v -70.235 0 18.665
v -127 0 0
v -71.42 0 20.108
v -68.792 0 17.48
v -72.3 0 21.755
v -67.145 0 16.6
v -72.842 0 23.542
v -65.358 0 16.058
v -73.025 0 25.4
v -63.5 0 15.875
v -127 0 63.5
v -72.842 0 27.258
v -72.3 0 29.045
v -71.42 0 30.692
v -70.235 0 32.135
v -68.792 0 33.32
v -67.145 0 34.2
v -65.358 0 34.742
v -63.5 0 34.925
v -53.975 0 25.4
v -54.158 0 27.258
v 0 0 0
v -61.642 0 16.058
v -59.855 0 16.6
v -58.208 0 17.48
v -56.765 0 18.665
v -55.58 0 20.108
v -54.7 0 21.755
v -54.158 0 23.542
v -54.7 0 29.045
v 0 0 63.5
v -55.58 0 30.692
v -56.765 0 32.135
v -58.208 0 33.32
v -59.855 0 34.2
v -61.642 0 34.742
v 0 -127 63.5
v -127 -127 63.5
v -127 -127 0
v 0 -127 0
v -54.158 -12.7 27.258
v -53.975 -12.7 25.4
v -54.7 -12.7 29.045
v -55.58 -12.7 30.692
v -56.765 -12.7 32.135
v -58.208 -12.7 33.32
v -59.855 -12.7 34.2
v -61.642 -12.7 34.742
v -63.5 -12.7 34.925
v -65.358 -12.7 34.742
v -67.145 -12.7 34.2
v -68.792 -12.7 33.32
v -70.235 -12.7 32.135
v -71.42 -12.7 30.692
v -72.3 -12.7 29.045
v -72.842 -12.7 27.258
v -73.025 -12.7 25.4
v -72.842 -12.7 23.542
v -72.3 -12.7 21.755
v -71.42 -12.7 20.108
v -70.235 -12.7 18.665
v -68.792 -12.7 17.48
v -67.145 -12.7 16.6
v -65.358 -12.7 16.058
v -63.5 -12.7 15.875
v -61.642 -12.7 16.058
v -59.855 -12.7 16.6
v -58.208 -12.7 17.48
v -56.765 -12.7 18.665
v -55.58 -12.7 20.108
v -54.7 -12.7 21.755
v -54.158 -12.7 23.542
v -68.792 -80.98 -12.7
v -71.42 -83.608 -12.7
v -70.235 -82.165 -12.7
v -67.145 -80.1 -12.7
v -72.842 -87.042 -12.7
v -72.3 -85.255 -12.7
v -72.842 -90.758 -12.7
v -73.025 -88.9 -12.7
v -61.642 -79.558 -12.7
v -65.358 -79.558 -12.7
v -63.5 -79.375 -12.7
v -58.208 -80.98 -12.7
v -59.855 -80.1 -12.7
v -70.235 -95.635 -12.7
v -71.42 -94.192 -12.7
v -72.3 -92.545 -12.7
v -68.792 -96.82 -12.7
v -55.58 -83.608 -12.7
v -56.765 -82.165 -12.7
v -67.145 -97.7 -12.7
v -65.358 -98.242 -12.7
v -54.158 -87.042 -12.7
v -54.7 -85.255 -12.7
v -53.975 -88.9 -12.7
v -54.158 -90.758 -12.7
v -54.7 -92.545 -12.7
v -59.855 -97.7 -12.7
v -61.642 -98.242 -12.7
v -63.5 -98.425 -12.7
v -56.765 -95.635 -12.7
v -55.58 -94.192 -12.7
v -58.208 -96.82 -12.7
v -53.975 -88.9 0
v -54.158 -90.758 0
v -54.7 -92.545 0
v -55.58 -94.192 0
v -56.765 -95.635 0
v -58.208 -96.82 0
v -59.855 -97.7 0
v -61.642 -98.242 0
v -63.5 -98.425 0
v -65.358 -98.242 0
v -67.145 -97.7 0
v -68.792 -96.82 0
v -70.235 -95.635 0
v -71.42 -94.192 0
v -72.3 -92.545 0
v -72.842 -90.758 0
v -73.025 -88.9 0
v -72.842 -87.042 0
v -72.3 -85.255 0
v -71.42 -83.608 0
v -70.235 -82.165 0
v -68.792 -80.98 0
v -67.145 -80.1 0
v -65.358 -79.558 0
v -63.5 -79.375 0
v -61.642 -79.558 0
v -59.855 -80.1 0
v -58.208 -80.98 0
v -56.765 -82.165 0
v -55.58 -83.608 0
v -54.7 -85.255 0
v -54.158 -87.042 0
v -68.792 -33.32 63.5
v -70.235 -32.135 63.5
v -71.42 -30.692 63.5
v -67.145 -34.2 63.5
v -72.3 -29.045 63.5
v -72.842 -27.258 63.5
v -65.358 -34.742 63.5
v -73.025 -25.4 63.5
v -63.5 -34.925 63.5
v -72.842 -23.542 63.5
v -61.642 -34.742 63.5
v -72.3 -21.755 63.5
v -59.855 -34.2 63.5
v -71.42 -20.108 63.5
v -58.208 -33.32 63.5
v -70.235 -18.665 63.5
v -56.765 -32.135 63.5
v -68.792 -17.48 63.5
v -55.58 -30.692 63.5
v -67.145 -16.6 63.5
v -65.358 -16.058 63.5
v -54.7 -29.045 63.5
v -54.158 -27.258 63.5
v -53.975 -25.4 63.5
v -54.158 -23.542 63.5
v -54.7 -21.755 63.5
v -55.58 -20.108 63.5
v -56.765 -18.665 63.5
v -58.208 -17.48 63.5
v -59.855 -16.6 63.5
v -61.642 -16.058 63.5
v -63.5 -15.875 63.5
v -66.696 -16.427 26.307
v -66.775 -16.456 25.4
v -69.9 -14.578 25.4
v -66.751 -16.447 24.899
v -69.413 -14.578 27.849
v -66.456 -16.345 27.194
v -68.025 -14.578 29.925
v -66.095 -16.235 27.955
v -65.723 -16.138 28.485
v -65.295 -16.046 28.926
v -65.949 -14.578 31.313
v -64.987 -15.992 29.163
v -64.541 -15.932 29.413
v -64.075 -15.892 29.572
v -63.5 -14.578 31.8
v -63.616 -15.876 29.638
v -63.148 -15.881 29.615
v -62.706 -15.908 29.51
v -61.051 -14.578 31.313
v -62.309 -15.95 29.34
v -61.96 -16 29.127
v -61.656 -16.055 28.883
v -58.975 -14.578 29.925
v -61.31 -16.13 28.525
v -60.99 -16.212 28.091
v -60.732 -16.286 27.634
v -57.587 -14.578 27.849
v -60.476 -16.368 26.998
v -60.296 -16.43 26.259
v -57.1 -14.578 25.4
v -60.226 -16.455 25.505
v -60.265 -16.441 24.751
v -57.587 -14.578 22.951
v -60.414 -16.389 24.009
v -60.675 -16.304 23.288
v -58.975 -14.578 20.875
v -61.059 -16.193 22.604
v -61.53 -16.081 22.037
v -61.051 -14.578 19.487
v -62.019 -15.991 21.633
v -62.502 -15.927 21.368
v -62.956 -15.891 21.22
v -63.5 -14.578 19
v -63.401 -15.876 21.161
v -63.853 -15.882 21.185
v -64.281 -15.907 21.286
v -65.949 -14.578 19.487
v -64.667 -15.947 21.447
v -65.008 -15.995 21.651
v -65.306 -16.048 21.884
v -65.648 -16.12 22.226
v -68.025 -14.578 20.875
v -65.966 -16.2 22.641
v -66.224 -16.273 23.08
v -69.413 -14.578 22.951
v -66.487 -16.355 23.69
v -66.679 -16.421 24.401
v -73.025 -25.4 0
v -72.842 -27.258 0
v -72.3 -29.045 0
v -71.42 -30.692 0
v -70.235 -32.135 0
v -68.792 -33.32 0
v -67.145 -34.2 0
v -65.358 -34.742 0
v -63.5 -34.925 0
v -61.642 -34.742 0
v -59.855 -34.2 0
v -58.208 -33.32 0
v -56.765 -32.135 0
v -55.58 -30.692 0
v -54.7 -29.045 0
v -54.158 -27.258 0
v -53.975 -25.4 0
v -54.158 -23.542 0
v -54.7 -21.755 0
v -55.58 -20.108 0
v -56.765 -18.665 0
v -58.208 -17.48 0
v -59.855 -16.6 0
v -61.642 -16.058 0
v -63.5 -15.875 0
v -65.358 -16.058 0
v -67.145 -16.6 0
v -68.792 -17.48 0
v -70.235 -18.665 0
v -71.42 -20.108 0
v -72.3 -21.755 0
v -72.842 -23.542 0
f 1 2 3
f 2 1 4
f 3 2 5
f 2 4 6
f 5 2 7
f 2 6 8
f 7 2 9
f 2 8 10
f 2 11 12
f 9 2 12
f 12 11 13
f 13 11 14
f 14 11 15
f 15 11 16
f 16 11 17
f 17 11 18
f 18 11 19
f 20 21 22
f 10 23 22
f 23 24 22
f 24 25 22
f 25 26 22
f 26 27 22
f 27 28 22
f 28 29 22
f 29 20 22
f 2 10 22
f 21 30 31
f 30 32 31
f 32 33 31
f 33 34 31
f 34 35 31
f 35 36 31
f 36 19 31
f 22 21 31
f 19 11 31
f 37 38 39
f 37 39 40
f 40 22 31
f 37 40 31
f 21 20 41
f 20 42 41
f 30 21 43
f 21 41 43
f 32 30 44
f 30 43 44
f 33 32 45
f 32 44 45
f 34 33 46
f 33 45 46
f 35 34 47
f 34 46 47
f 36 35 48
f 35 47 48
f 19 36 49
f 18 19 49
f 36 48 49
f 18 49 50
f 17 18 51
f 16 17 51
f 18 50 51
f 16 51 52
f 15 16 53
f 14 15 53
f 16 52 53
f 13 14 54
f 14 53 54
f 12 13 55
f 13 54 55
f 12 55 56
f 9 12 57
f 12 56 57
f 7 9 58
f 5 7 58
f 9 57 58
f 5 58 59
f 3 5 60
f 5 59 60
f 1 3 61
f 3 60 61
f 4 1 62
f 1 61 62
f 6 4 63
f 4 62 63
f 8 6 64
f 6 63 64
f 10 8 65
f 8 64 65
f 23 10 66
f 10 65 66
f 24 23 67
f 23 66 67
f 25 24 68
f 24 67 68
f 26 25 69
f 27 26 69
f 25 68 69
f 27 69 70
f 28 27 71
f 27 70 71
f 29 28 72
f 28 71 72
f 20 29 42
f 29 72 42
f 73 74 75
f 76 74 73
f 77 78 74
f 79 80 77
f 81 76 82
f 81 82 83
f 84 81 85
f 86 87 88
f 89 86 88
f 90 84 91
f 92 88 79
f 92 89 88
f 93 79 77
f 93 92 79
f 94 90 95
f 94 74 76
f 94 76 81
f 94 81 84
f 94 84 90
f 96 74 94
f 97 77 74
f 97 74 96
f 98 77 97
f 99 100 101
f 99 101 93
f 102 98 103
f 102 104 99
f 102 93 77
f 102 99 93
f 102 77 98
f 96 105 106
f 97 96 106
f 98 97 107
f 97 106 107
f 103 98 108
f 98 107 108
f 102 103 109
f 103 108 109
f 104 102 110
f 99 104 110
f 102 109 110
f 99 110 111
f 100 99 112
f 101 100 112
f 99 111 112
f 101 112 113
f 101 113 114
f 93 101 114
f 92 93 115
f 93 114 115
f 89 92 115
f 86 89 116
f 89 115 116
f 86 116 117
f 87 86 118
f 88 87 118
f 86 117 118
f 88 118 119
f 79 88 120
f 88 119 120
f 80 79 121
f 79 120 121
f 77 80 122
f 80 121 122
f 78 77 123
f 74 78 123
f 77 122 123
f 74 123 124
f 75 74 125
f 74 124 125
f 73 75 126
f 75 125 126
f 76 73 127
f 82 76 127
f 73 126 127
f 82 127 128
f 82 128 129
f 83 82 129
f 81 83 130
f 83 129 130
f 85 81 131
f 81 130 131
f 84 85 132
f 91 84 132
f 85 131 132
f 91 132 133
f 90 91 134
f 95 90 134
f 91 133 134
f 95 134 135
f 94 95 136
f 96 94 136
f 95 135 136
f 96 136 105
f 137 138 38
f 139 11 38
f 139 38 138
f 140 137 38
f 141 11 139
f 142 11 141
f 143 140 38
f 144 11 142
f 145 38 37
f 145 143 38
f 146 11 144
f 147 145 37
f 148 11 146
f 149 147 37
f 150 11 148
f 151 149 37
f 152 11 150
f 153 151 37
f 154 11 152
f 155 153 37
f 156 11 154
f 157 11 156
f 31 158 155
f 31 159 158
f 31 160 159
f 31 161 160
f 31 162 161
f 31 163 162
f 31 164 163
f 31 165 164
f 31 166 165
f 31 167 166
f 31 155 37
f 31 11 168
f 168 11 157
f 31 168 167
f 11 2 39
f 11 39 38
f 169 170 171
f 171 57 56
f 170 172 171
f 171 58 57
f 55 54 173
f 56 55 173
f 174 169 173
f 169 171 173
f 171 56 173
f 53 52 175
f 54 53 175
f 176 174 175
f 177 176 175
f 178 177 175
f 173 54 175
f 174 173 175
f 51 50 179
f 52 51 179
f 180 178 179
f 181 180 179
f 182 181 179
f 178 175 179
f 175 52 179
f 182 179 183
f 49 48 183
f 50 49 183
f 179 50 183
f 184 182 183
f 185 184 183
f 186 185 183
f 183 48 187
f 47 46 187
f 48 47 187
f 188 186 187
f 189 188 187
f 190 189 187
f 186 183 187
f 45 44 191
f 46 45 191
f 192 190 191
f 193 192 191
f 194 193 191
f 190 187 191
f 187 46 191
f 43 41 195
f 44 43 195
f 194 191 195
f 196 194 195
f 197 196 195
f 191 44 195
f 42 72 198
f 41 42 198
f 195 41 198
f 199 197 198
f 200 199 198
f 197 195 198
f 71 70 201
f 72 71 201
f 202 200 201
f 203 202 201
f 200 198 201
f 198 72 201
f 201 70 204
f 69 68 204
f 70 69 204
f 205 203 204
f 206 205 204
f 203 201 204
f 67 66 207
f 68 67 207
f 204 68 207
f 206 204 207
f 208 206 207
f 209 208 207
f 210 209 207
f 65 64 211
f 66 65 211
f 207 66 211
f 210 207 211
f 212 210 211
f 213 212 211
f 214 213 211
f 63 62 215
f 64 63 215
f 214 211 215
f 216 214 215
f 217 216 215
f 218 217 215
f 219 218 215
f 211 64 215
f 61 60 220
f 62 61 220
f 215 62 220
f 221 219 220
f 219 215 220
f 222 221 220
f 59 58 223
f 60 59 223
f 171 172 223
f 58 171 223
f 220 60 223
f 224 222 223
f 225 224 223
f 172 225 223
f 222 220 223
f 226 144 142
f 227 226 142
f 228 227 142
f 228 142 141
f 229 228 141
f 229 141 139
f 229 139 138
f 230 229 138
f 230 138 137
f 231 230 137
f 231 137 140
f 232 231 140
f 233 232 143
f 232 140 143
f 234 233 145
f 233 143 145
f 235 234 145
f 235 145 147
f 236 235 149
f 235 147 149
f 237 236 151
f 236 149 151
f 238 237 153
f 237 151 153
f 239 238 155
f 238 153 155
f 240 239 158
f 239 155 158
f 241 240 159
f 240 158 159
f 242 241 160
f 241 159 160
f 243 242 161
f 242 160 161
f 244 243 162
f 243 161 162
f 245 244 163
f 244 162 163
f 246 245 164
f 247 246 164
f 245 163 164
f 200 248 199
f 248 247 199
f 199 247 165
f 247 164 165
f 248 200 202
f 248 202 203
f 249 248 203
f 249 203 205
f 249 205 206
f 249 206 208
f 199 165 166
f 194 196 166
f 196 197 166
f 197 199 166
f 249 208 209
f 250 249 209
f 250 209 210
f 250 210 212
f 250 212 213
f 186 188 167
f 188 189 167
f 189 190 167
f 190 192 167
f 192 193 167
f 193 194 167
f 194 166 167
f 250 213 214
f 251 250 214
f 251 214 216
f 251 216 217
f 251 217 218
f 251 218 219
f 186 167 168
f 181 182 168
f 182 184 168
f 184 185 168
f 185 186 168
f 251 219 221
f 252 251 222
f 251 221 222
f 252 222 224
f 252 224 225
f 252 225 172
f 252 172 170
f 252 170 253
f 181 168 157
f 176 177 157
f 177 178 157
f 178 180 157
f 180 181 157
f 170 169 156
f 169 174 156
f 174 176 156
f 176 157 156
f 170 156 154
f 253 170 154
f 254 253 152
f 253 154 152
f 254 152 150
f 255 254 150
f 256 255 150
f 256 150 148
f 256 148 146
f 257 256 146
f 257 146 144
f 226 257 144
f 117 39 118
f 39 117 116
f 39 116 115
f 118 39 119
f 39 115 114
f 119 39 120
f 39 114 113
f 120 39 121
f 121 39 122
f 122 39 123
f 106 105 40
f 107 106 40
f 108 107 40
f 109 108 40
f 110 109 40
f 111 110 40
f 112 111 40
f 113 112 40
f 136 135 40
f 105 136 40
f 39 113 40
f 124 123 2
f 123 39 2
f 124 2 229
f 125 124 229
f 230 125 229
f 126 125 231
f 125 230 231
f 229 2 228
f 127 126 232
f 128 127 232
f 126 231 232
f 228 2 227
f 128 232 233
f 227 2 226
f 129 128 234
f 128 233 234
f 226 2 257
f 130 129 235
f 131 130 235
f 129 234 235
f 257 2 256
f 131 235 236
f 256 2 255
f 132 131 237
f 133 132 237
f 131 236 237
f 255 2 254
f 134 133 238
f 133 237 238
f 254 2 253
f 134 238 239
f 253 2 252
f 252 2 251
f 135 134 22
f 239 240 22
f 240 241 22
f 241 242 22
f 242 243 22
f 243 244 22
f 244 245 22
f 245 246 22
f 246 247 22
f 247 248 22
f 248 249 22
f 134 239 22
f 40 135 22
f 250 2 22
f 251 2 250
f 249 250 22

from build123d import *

# Parameters (mm, degrees)
F0_W     = 127
F0_H     = 63.5
F1_DEPTH = 127
F3_D     = 19.05
F4_R     = 9.525
F5_DEPTH = 12.7
F7_D     = 19.05
F7_DEPTH = 12.7
F7_TIP   = 5.7231973962


with BuildPart() as f1:
    # F0 (on Front) → F1 (new body)
    with BuildSketch(Plane.XZ):
        with Locations((-63.5, 31.75)):
            Rectangle(F0_W, F0_H)
    extrude(amount=F1_DEPTH)

    # F3 (through all)
    with Locations(Plane(origin=(0, 0, 0), x_dir=(1, 0, 0), z_dir=(0, 0, -1))):
        with Locations((-63.5, 25.4)):
            Hole(F3_D / 2)

    # F4 (on face) → F5 (join)
    with BuildSketch(Plane(origin=(0, 0, 0), x_dir=(1, 0, 0), z_dir=(0, 0, -1))):
        with Locations((-63.5, 88.9)):
            Circle(F4_R)
    extrude(amount=F5_DEPTH)

    # F7
    with Locations(Plane(origin=(0, 0, 0), x_dir=(-1, 0, 0), z_dir=(0, 1, 0))):
        with Locations((63.5, 25.4)):
            Hole(F7_D / 2, depth=F7_DEPTH)
            with Locations((0, 0, -(F7_DEPTH + F7_TIP / 2))):  # 118° drill point
                Cone(0, F7_D / 2, F7_TIP, mode=Mode.SUBTRACT)


solid = f1.part
